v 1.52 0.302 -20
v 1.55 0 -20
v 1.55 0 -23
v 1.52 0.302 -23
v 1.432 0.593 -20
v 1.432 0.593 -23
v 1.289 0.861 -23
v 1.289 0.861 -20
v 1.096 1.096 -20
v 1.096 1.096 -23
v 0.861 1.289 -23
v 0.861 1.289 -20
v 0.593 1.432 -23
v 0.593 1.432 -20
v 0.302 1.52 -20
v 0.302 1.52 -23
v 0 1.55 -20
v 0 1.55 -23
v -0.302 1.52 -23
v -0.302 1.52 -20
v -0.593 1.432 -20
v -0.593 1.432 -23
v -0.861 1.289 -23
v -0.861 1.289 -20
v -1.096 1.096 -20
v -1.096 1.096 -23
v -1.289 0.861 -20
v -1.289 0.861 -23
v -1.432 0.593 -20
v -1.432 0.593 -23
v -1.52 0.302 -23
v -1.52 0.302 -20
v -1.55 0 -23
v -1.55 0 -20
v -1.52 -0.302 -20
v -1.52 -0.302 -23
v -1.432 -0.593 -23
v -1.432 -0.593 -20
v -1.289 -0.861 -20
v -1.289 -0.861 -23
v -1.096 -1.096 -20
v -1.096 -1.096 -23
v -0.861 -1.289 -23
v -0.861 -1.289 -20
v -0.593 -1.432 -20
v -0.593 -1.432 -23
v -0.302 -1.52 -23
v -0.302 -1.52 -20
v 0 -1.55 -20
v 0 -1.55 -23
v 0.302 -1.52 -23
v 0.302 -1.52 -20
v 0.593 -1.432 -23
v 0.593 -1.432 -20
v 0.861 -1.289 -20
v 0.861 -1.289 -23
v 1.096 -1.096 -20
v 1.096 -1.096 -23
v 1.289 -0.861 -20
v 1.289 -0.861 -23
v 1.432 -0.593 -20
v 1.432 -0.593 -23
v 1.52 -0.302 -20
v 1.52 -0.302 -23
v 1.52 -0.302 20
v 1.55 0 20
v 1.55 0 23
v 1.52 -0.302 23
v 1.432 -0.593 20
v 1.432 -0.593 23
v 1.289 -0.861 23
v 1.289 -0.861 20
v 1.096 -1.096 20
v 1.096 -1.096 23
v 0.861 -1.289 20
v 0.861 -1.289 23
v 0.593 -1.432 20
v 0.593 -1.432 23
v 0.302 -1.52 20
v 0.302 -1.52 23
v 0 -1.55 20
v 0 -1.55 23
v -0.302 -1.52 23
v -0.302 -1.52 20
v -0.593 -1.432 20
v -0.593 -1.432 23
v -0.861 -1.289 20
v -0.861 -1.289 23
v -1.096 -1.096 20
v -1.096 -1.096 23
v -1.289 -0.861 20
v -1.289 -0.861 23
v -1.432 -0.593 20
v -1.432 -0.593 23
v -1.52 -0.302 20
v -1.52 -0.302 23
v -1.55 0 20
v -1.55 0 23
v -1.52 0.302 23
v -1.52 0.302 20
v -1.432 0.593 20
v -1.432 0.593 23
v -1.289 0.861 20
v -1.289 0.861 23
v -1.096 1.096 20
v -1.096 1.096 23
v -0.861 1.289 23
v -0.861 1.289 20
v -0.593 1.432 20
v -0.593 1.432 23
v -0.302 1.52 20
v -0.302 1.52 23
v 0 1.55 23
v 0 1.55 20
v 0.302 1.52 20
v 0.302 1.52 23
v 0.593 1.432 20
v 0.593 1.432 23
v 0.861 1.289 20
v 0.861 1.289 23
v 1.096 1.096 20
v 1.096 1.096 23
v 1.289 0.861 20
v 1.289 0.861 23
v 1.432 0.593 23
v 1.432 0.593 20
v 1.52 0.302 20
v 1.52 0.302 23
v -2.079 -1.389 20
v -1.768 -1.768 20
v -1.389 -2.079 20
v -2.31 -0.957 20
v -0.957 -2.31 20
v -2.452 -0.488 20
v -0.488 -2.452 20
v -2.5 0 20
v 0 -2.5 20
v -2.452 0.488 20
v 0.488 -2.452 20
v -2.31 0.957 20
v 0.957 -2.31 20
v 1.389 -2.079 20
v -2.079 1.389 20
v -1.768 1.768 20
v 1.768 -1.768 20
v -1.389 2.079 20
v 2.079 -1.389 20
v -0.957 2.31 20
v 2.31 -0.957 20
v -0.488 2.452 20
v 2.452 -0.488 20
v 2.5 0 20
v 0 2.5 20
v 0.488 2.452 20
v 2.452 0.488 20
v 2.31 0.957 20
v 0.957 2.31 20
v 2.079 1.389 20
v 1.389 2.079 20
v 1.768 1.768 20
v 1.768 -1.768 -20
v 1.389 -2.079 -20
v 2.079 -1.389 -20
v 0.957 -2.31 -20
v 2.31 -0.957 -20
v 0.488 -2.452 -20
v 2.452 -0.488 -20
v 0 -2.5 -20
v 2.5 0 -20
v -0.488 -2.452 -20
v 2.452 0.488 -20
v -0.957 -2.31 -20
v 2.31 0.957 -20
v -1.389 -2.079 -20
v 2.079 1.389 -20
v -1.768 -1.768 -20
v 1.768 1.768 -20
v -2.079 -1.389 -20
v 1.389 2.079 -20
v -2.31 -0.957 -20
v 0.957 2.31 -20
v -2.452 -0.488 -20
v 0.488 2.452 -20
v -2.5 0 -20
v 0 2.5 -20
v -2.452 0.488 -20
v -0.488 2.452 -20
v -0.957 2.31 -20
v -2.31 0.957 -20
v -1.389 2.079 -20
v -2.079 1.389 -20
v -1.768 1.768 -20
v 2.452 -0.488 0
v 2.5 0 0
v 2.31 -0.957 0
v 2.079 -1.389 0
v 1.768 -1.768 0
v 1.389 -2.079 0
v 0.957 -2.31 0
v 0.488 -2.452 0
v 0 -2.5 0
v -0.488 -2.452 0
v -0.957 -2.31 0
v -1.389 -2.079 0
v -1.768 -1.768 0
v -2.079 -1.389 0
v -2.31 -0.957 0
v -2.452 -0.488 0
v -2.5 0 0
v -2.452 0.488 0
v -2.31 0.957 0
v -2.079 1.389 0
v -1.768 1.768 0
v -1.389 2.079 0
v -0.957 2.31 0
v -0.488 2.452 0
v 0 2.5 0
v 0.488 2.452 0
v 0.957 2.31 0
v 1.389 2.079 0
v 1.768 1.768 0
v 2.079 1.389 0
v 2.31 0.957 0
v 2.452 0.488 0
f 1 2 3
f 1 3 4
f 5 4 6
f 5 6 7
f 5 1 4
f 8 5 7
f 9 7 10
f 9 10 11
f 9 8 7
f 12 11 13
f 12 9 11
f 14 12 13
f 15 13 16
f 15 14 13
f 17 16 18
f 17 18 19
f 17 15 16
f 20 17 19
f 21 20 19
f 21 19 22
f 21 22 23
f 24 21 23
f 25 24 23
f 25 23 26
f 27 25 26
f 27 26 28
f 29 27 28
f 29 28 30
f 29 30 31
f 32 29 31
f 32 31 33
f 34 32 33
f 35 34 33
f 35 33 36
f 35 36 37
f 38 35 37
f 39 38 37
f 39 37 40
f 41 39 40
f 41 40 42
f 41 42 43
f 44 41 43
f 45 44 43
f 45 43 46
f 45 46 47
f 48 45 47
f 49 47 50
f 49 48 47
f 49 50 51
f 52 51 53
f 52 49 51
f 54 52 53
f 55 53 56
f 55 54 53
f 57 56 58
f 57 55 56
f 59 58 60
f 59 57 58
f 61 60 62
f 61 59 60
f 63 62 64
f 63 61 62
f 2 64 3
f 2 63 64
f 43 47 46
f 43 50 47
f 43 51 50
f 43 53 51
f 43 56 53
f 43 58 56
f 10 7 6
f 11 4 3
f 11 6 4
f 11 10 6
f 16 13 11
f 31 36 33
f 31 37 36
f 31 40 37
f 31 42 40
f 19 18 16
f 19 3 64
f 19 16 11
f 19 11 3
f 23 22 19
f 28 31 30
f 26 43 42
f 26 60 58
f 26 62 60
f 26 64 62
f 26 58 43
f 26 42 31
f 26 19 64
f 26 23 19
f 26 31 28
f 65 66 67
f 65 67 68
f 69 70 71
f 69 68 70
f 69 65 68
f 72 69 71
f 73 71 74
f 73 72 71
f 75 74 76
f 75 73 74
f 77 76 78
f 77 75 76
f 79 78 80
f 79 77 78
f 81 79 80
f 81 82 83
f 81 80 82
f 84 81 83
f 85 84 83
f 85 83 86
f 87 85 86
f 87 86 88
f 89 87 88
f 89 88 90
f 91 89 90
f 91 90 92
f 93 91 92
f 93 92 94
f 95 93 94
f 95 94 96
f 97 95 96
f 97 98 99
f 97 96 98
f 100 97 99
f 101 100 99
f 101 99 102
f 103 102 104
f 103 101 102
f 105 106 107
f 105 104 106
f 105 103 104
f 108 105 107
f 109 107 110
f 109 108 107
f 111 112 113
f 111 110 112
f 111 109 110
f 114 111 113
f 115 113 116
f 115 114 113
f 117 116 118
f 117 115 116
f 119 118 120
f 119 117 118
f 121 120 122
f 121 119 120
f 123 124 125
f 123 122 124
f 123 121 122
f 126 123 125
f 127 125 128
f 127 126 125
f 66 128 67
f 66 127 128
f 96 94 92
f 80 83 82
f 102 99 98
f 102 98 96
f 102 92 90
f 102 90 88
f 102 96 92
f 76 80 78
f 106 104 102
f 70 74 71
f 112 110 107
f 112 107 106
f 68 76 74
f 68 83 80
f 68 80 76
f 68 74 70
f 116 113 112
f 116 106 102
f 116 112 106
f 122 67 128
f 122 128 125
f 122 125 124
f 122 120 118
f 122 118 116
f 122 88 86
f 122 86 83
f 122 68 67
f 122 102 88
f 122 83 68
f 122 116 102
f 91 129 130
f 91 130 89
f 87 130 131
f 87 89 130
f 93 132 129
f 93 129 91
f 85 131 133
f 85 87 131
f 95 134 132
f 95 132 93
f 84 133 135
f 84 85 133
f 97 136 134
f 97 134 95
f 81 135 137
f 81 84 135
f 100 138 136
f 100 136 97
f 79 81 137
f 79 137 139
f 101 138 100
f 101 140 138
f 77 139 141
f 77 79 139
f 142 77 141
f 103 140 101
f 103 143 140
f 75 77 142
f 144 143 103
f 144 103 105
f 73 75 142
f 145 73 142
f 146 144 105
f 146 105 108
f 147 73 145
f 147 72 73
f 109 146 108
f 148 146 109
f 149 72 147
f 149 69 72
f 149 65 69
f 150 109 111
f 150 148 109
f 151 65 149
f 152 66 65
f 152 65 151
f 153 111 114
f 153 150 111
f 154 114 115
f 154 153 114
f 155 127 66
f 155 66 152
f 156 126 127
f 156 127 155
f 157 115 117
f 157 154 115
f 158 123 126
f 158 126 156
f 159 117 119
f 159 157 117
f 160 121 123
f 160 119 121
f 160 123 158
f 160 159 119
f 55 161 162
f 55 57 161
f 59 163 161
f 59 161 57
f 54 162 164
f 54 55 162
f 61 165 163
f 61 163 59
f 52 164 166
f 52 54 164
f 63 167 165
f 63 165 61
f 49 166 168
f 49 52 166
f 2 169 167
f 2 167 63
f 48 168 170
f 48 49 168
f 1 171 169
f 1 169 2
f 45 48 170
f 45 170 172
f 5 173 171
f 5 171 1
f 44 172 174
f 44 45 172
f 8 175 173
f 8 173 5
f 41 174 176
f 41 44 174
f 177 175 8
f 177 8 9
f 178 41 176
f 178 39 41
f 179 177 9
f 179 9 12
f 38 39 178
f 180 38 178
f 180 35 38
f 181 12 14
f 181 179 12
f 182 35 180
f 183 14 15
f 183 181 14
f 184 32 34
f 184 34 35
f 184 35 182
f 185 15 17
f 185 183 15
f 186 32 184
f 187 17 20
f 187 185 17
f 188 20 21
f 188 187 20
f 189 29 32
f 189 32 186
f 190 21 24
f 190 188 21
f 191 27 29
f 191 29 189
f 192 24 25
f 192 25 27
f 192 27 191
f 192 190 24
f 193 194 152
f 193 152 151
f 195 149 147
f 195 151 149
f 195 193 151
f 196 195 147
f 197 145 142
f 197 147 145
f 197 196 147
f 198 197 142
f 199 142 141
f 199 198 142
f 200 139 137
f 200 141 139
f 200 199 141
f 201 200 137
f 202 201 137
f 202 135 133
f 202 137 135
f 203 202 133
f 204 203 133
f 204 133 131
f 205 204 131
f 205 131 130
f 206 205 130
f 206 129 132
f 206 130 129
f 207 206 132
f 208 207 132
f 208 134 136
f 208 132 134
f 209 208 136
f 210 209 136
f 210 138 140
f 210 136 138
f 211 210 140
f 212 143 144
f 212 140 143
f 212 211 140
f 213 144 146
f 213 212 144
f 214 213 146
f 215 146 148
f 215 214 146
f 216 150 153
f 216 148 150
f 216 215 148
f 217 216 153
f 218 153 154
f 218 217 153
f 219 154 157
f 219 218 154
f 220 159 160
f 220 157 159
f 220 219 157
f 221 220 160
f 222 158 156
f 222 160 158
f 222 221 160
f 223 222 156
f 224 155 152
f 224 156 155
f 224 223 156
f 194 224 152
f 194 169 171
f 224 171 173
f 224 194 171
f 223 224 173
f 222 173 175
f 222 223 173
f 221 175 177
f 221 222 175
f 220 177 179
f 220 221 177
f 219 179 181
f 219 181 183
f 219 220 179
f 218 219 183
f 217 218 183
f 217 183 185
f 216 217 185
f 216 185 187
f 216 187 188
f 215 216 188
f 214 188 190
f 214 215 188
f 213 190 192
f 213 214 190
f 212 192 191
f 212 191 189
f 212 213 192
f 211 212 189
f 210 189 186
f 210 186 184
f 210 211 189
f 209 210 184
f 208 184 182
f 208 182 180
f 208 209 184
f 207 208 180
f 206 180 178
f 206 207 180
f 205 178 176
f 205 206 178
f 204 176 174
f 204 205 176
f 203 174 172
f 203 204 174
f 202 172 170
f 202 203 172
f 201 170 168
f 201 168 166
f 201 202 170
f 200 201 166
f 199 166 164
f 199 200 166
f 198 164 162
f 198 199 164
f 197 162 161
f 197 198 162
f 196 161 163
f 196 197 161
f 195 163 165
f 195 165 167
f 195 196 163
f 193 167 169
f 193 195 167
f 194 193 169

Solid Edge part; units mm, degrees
sketch "Sketch1" plane through (0, 0, 0) normal (0, 0, 1) x (1, 0, 0)
  circle A0 centre (0, 0) radius 2.5
  dimension "D1" = 5
extrude "Ajout_matière_1" add sketch "Sketch1" along normal blind 20
sketch "Sketch2" plane through (0, 0, 20) normal (0, 0, 1) x (1, 0, 0)
  circle A0 centre (0, 0) radius 1.55
  dimension "D1" = 3.1
extrude "Ajout_matière_2" add sketch "Sketch2" along normal blind 3
mirror "Mirror1" about plane through (0, 0, 0) normal (0, 0, 1) of "Ajout_matière_1", "Ajout_matière_2"
properties material "Acier S235"
